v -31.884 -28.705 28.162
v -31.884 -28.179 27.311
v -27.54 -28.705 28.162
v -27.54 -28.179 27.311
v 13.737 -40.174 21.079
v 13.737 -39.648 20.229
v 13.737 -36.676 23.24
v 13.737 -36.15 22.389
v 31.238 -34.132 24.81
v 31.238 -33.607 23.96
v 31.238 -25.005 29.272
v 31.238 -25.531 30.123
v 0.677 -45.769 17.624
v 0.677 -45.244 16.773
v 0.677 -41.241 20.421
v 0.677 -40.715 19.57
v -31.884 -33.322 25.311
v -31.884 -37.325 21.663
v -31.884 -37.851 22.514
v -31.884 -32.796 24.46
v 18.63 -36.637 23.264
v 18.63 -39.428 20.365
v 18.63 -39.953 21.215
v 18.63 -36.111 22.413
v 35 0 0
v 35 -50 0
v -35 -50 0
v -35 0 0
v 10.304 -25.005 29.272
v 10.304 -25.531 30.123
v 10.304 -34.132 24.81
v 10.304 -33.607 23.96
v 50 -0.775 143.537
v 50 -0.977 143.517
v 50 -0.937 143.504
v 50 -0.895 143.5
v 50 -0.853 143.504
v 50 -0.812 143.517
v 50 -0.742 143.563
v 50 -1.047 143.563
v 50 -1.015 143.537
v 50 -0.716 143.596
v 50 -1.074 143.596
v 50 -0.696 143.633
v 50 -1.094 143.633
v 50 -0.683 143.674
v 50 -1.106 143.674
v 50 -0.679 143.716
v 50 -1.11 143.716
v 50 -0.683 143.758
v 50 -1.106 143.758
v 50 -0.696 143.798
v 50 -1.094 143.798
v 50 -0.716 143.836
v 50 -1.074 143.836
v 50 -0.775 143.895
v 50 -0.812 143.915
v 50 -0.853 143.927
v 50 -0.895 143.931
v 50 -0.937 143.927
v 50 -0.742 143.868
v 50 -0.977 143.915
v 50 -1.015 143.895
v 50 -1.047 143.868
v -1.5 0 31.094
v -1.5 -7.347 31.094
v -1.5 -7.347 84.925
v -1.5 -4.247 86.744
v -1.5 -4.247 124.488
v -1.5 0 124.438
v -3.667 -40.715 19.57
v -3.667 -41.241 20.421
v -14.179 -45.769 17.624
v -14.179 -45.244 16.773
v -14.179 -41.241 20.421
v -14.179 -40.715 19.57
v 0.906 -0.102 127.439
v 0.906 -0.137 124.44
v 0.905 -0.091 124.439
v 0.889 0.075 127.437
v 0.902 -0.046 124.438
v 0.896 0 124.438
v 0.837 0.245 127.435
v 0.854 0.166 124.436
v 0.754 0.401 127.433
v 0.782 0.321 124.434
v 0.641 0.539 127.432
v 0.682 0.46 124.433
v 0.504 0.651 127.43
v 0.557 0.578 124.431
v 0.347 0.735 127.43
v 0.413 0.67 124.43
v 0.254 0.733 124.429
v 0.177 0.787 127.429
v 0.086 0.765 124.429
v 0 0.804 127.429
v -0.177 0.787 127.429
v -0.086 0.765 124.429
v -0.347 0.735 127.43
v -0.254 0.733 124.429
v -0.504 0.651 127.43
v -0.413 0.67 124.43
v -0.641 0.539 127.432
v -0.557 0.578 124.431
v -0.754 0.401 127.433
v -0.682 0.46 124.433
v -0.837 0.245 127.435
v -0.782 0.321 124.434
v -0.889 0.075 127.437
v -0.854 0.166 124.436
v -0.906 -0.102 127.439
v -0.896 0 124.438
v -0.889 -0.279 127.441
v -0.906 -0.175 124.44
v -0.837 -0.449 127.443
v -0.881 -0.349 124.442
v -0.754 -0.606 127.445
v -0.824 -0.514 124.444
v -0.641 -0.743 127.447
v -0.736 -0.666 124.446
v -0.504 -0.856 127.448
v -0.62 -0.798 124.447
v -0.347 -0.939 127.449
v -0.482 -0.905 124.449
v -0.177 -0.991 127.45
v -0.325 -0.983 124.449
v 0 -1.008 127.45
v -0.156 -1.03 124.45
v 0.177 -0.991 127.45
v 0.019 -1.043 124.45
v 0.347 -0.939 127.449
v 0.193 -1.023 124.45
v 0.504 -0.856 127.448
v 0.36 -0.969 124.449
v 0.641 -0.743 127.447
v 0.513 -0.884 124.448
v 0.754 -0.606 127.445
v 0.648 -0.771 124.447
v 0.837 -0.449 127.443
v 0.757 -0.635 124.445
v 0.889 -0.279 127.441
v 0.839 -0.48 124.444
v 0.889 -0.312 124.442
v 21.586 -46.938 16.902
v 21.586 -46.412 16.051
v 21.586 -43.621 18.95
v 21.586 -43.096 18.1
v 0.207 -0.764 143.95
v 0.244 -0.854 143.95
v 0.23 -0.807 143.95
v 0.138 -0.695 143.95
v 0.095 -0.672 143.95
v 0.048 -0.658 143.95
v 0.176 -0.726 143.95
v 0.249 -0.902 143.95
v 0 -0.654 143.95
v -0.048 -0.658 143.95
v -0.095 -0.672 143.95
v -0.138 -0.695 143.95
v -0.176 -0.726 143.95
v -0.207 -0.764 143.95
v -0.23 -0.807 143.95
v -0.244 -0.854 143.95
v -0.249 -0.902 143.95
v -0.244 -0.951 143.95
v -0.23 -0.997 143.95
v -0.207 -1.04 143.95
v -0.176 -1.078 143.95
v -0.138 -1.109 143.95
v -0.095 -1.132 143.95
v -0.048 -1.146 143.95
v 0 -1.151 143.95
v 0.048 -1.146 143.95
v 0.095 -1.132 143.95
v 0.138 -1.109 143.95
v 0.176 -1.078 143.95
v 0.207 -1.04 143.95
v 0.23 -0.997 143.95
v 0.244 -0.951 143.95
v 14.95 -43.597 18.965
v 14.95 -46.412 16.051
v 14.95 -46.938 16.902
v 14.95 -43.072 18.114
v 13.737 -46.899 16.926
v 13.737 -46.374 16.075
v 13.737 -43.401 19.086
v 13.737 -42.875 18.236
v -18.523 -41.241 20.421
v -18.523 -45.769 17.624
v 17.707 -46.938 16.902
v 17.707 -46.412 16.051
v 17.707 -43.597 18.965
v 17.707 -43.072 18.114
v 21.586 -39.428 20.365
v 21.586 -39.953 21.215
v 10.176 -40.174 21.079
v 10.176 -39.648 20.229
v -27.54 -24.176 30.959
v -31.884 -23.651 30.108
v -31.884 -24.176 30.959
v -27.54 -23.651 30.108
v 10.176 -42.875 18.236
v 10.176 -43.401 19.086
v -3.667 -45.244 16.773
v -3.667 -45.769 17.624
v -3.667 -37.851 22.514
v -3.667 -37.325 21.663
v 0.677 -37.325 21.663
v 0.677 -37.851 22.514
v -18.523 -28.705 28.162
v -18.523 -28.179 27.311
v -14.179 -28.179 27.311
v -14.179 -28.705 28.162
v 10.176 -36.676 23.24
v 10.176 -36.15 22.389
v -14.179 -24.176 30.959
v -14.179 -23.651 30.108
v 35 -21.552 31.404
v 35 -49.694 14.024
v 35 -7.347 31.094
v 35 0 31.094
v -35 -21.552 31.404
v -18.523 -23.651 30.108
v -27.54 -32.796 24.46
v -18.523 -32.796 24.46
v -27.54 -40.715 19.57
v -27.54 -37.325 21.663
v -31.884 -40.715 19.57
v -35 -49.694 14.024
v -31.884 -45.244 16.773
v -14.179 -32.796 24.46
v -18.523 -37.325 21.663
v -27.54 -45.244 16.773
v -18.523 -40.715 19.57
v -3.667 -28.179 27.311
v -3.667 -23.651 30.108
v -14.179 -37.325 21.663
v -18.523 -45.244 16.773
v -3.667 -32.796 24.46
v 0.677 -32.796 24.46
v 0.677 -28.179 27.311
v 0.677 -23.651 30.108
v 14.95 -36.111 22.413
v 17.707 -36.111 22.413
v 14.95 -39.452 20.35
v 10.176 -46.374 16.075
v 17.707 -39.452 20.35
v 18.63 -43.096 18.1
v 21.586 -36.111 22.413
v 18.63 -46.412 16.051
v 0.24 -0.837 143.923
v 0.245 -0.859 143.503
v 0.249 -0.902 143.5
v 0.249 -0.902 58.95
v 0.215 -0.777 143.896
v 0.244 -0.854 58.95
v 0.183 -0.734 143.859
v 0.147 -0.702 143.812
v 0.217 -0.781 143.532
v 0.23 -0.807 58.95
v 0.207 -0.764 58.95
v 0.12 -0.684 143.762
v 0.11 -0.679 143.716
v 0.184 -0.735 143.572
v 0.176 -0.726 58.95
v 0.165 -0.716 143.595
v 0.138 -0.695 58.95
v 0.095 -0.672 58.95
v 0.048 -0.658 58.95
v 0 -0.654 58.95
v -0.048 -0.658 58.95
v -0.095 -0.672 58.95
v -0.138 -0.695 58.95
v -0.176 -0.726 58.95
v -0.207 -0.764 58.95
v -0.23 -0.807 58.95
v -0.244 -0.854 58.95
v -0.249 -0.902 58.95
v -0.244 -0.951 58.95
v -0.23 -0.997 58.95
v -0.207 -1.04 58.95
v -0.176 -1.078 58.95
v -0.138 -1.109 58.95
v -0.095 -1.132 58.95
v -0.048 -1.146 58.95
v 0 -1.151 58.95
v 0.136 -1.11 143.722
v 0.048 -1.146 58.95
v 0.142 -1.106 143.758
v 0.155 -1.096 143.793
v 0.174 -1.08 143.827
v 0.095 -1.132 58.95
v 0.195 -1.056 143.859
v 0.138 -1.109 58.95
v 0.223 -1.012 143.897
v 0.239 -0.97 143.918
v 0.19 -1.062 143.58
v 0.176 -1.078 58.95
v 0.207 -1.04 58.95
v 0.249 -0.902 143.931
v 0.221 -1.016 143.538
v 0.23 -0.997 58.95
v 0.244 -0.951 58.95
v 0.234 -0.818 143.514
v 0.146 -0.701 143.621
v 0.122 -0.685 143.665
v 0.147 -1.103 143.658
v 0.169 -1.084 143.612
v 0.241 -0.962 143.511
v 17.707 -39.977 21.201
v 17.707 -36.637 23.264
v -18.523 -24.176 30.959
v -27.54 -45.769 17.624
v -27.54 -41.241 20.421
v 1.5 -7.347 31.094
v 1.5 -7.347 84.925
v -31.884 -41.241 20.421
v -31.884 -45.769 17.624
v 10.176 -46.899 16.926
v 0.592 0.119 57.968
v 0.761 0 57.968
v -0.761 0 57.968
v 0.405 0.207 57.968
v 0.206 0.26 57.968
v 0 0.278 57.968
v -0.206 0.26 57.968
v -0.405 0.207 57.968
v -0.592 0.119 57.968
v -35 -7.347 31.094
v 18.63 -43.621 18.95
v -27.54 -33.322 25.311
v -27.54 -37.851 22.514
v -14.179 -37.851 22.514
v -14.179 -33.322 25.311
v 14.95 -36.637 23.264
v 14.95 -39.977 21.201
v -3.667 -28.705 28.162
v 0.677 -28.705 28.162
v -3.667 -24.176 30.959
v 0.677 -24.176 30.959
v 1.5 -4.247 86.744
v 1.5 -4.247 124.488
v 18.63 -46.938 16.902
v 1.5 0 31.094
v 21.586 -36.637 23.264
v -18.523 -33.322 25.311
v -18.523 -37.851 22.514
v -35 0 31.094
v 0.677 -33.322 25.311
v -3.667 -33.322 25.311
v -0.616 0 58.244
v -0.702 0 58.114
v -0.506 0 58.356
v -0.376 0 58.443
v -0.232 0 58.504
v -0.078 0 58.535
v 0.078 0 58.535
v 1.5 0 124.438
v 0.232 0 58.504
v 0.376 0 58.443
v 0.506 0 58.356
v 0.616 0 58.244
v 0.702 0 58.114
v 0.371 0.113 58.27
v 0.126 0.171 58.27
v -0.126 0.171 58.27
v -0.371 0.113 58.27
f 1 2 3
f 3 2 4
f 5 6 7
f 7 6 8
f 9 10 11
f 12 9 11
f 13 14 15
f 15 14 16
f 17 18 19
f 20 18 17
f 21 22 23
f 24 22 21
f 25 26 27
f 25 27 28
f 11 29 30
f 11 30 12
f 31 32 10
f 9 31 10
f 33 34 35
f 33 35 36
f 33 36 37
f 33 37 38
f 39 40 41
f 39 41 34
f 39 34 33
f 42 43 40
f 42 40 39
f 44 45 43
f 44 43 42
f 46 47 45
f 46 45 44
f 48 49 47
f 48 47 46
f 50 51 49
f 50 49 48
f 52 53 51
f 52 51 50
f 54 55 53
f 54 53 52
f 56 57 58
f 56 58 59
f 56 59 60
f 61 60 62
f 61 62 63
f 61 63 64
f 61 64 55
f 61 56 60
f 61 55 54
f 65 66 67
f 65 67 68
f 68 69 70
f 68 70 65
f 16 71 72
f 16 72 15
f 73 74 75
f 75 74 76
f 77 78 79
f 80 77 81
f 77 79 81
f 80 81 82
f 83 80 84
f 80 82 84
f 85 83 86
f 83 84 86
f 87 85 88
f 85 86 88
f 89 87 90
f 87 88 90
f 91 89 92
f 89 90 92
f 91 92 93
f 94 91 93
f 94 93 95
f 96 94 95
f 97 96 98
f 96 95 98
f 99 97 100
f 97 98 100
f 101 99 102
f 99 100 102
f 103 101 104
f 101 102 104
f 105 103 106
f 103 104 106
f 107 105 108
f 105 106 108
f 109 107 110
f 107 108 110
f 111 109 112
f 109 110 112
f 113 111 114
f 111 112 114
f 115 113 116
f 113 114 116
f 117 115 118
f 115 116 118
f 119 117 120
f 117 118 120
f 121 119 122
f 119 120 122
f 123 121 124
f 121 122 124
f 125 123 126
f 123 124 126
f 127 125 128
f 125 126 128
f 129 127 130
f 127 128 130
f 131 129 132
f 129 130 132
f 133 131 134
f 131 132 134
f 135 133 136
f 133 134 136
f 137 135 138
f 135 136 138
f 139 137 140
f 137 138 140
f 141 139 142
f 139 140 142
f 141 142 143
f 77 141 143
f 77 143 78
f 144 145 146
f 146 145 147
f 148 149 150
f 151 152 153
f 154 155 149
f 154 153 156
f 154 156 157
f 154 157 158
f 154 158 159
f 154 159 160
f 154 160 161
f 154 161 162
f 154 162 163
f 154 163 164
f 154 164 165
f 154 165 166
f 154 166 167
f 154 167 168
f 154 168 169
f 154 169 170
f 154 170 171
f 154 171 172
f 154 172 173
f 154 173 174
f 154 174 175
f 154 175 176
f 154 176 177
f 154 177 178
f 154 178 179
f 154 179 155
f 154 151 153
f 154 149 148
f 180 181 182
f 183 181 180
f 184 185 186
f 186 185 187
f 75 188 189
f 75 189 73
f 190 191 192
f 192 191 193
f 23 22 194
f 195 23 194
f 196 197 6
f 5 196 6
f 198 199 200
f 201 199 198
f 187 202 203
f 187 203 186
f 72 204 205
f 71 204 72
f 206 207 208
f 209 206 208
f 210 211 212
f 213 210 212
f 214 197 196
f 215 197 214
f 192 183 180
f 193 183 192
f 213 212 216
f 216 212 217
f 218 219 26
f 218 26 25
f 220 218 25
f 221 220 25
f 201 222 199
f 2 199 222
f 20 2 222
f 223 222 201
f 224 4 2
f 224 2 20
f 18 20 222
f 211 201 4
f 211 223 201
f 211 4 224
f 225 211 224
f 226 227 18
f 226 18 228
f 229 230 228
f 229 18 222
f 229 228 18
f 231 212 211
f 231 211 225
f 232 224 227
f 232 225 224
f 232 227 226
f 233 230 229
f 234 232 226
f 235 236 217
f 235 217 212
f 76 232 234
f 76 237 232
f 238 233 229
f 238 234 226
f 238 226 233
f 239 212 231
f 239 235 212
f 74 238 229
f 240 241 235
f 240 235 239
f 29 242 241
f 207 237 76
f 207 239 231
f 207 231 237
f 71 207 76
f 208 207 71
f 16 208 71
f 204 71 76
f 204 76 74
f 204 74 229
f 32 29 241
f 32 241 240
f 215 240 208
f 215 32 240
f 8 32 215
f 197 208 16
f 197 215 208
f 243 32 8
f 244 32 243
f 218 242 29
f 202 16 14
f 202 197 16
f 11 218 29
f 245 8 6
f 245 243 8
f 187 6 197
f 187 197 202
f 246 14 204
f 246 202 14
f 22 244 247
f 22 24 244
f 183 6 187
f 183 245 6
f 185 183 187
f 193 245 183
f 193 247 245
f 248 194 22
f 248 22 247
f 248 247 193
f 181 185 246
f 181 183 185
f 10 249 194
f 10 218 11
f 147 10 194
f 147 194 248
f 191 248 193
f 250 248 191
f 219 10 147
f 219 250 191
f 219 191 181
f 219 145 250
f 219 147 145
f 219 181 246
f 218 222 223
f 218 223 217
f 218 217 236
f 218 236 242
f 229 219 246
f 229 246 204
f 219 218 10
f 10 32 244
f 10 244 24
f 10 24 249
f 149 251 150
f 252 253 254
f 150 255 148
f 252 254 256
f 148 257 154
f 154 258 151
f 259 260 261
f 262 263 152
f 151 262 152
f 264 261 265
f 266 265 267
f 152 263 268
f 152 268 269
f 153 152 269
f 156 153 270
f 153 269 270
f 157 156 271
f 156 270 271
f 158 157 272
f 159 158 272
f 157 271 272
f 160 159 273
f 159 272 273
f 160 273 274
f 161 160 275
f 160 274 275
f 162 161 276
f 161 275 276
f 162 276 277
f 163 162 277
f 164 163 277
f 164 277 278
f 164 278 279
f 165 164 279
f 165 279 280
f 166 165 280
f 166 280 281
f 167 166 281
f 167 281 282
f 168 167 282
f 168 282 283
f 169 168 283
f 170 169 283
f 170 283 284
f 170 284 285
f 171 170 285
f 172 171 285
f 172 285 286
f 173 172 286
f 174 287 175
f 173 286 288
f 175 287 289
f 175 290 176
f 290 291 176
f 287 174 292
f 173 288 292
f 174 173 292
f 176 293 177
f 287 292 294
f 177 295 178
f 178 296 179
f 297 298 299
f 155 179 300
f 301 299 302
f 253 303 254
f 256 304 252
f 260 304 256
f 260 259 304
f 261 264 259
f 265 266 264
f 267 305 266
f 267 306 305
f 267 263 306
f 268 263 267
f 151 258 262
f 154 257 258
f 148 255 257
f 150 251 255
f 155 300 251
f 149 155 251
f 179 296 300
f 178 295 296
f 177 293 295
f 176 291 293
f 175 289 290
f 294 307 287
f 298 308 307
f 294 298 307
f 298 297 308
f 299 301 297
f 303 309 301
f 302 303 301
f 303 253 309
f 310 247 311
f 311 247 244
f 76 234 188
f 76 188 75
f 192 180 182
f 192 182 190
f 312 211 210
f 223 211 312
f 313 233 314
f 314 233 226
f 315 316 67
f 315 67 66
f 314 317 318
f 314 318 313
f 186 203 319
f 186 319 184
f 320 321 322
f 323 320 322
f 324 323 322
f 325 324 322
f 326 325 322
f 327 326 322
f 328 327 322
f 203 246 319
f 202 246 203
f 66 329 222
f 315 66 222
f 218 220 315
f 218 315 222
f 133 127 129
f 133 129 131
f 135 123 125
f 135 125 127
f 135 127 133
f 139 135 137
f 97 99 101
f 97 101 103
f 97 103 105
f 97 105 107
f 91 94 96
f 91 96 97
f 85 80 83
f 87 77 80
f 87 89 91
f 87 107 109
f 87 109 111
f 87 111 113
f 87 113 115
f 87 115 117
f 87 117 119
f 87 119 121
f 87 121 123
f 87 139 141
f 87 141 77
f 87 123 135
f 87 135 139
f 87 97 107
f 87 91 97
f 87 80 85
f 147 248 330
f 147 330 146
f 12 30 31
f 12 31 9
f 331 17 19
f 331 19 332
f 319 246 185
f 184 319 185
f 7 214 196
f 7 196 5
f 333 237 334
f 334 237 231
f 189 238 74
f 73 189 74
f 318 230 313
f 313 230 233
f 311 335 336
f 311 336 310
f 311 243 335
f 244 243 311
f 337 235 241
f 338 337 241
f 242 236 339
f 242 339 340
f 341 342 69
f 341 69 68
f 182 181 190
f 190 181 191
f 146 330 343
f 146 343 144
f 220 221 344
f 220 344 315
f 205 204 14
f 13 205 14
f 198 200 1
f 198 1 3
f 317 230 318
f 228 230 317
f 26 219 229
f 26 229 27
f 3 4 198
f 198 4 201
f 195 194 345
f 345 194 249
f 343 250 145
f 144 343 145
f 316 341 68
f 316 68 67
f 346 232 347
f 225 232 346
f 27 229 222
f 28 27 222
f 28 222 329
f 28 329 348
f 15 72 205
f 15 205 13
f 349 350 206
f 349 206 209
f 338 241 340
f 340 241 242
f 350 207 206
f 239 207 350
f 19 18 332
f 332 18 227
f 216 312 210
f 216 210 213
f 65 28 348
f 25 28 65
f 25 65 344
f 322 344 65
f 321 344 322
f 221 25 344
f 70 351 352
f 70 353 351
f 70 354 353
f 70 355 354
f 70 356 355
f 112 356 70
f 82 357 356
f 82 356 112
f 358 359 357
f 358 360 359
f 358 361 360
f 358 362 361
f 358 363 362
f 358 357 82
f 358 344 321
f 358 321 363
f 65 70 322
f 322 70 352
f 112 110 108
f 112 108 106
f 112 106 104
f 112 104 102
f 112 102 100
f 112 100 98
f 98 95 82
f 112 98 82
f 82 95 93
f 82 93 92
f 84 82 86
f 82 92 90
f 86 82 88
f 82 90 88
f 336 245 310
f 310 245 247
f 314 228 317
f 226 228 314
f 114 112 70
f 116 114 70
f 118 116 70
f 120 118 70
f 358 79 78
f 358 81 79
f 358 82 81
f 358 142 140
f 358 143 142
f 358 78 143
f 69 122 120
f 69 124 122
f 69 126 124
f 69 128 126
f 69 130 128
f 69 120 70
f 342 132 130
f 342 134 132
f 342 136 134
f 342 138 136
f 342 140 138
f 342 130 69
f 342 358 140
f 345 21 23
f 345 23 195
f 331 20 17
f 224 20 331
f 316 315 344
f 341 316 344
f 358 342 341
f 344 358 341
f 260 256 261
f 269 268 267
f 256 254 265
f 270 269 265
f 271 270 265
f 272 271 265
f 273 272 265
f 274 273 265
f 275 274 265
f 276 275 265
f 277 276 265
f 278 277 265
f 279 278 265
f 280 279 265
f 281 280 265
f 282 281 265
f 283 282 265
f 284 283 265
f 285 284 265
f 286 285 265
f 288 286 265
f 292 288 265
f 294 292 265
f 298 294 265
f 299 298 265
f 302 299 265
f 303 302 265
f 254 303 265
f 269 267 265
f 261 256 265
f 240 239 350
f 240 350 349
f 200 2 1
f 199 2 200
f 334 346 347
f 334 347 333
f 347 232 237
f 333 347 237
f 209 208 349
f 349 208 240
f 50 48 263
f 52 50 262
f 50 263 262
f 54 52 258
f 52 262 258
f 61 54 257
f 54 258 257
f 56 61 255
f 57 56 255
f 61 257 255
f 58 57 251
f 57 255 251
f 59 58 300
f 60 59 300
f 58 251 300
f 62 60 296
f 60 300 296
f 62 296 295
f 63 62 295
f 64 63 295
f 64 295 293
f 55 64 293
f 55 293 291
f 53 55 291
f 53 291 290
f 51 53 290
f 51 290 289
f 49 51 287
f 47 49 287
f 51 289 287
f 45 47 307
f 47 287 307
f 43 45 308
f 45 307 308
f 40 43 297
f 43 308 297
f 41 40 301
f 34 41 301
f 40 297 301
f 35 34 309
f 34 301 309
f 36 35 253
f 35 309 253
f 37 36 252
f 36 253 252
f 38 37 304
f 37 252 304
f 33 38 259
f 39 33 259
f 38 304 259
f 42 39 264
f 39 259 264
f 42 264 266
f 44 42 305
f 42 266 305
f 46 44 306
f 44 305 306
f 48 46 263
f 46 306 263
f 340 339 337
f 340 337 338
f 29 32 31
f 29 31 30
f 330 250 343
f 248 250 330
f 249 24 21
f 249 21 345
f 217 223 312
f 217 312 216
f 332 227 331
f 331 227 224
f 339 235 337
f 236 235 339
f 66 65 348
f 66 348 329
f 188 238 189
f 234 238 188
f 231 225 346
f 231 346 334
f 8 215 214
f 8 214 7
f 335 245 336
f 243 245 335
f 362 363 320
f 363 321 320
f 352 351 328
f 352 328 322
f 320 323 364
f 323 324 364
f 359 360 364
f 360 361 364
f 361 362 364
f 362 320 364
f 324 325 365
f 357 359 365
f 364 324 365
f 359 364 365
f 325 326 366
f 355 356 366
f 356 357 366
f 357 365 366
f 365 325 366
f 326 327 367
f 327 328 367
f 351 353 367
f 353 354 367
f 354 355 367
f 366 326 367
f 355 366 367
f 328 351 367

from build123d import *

# Parameters (mm, degrees)
F1_DEPTH  = 35
F2_DEPTH  = 1.5
F3_R      = 0.9063099794
F4_DEPTH  = 3
F9_R      = 0.2485402387
F10_DEPTH = 85
F11_R     = 0.2155847927
F12_DEPTH = 50
F13_W     = 4.3444237293
F13_H     = 5.3226868622
F13_W_2   = 20.9337938577
F13_H_2   = 10.1097906008
F13_W_3   = 3.5610813648
F13_H_3   = 4.1115768254
F13_W_4   = 2.7570873499
F13_H_4   = 3.9258003235
F13_W_5   = 2.9557980597
F13_H_5   = 3.8980096579
F14_DEPTH = 1


with BuildPart() as f1:
    # F0 (on Right) → F1 (new body, symmetric)
    with BuildSketch(Plane.YZ):
        Polygon((0, 0), (0, 31.094250305), (-7.3470045094, 31.094250305), (-21.5524604427, 31.4040603044), (-49.6941367908, 14.0244871014), (-50, 0), align=None)
    extrude(amount=F1_DEPTH, both=True)

    # F0 (on Right) → F2 (join, symmetric)
    with BuildSketch(Plane.YZ):
        Polygon((0, 31.094250305), (0, 124.4379070823), (-4.2471511877, 124.4876444022), (-4.2471511877, 86.7436423779), (-7.3470045094, 84.9254530919), (-7.3470045094, 31.094250305), align=None)
        Polygon((0, 0), (0, 31.094250305), (-7.3470045094, 31.094250305), (-21.5524604427, 31.4040603044), (-49.6941367908, 14.0244871014), (-50, 0), align=None)
    extrude(amount=F2_DEPTH, both=True)

    # F3 (on face) → F4 (join)
    with BuildSketch(Plane(origin=(0, 1.4570612262, 124.4208438045), x_dir=(1, 0, 0), z_dir=(0, 0.0117099457, 0.9999314362))):
        with Locations((0, -1.5943597537)):
            Circle(F3_R)
    extrude(amount=F4_DEPTH)

    # F6 (on offset) → F7 (revolve)
    with BuildSketch(Plane.XZ.offset(0.9)):
        with BuildLine():
            Line((-0.8982078871, 57.9684637487), (0, 57.9684637487))
            Line((0, 57.9684637487), (0, 58.9450188641))
            ThreePointArc((0, 58.9450188641), (-0.7652386155, 58.6691521683), (-1.1784314411, 57.9684637487))
            Line((-1.1784314411, 57.9684637487), (-0.8982078871, 57.9684637487))
        make_face()
    revolve(axis=Axis((0, -0.9, 58.2875237199), (0, 0, 1)))

    # F13 (on face) → F14 (join)
    with BuildSketch(Plane(origin=(0, -19.9901856633, 32.3688808984), x_dir=(1, 0, 0), z_dir=(0, -0.5254480068, 0.850825712))):
        with Locations((-29.7119121344, -6.9637915585)):
            Rectangle(F13_W, F13_H)
        with Locations((-16.3510192841, -6.9637915585)):
            Rectangle(F13_W, F13_H)
        with Locations((-29.7119121344, -17.7128741052)):
            Rectangle(F13_W, F13_H)
        with Locations((-16.3510192841, -17.7128741052)):
            Rectangle(F13_W, F13_H)
        with Locations((-1.4951310397, -6.9637915585)):
            Rectangle(F13_W, F13_H)
        with Locations((-1.4951310397, -17.7128741052)):
            Rectangle(F13_W, F13_H)
        with Locations((-29.7119121344, -27.019901434)):
            Rectangle(F13_W, F13_H)
        with Locations((-16.3510192841, -27.019901434)):
            Rectangle(F13_W, F13_H)
        with Locations((-1.4951310397, -27.019901434)):
            Rectangle(F13_W, F13_H)
        with Locations((20.7709427923, -10.9491236508)):
            Rectangle(F13_W_2, F13_H_2)
        with Locations((11.956452392, -21.0489500314)):
            Rectangle(F13_W_3, F13_H_3)
        with Locations((16.3280665874, -20.910743624)):
            Rectangle(F13_W_4, F13_H_4)
        with Locations((20.1081242412, -20.8968482912)):
            Rectangle(F13_W_5, F13_H_5)
        with Locations((20.1081242412, -29.1055589914)):
            Rectangle(F13_W_5, F13_H_5)
        with Locations((16.3280665874, -29.0916636586)):
            Rectangle(F13_W_4, F13_H_4)
        with Locations((11.956452392, -28.9534572512)):
            Rectangle(F13_W_3, F13_H_3)
    extrude(amount=F14_DEPTH)


with BuildPart() as f10:
    # F9 (on offset) → F10 (new body)
    with BuildSketch(Plane.XY.offset(58.95)):
        with Locations((0, -0.9020901052)):
            Circle(F9_R)
    extrude(amount=F10_DEPTH)

    # F11 (on Right) → F12 (join)
    with BuildSketch(Plane.YZ):
        with Locations((-0.894861063, 143.7157690525)):
            Circle(F11_R)
    extrude(amount=F12_DEPTH)


solid = Compound([f1.part, f10.part])
